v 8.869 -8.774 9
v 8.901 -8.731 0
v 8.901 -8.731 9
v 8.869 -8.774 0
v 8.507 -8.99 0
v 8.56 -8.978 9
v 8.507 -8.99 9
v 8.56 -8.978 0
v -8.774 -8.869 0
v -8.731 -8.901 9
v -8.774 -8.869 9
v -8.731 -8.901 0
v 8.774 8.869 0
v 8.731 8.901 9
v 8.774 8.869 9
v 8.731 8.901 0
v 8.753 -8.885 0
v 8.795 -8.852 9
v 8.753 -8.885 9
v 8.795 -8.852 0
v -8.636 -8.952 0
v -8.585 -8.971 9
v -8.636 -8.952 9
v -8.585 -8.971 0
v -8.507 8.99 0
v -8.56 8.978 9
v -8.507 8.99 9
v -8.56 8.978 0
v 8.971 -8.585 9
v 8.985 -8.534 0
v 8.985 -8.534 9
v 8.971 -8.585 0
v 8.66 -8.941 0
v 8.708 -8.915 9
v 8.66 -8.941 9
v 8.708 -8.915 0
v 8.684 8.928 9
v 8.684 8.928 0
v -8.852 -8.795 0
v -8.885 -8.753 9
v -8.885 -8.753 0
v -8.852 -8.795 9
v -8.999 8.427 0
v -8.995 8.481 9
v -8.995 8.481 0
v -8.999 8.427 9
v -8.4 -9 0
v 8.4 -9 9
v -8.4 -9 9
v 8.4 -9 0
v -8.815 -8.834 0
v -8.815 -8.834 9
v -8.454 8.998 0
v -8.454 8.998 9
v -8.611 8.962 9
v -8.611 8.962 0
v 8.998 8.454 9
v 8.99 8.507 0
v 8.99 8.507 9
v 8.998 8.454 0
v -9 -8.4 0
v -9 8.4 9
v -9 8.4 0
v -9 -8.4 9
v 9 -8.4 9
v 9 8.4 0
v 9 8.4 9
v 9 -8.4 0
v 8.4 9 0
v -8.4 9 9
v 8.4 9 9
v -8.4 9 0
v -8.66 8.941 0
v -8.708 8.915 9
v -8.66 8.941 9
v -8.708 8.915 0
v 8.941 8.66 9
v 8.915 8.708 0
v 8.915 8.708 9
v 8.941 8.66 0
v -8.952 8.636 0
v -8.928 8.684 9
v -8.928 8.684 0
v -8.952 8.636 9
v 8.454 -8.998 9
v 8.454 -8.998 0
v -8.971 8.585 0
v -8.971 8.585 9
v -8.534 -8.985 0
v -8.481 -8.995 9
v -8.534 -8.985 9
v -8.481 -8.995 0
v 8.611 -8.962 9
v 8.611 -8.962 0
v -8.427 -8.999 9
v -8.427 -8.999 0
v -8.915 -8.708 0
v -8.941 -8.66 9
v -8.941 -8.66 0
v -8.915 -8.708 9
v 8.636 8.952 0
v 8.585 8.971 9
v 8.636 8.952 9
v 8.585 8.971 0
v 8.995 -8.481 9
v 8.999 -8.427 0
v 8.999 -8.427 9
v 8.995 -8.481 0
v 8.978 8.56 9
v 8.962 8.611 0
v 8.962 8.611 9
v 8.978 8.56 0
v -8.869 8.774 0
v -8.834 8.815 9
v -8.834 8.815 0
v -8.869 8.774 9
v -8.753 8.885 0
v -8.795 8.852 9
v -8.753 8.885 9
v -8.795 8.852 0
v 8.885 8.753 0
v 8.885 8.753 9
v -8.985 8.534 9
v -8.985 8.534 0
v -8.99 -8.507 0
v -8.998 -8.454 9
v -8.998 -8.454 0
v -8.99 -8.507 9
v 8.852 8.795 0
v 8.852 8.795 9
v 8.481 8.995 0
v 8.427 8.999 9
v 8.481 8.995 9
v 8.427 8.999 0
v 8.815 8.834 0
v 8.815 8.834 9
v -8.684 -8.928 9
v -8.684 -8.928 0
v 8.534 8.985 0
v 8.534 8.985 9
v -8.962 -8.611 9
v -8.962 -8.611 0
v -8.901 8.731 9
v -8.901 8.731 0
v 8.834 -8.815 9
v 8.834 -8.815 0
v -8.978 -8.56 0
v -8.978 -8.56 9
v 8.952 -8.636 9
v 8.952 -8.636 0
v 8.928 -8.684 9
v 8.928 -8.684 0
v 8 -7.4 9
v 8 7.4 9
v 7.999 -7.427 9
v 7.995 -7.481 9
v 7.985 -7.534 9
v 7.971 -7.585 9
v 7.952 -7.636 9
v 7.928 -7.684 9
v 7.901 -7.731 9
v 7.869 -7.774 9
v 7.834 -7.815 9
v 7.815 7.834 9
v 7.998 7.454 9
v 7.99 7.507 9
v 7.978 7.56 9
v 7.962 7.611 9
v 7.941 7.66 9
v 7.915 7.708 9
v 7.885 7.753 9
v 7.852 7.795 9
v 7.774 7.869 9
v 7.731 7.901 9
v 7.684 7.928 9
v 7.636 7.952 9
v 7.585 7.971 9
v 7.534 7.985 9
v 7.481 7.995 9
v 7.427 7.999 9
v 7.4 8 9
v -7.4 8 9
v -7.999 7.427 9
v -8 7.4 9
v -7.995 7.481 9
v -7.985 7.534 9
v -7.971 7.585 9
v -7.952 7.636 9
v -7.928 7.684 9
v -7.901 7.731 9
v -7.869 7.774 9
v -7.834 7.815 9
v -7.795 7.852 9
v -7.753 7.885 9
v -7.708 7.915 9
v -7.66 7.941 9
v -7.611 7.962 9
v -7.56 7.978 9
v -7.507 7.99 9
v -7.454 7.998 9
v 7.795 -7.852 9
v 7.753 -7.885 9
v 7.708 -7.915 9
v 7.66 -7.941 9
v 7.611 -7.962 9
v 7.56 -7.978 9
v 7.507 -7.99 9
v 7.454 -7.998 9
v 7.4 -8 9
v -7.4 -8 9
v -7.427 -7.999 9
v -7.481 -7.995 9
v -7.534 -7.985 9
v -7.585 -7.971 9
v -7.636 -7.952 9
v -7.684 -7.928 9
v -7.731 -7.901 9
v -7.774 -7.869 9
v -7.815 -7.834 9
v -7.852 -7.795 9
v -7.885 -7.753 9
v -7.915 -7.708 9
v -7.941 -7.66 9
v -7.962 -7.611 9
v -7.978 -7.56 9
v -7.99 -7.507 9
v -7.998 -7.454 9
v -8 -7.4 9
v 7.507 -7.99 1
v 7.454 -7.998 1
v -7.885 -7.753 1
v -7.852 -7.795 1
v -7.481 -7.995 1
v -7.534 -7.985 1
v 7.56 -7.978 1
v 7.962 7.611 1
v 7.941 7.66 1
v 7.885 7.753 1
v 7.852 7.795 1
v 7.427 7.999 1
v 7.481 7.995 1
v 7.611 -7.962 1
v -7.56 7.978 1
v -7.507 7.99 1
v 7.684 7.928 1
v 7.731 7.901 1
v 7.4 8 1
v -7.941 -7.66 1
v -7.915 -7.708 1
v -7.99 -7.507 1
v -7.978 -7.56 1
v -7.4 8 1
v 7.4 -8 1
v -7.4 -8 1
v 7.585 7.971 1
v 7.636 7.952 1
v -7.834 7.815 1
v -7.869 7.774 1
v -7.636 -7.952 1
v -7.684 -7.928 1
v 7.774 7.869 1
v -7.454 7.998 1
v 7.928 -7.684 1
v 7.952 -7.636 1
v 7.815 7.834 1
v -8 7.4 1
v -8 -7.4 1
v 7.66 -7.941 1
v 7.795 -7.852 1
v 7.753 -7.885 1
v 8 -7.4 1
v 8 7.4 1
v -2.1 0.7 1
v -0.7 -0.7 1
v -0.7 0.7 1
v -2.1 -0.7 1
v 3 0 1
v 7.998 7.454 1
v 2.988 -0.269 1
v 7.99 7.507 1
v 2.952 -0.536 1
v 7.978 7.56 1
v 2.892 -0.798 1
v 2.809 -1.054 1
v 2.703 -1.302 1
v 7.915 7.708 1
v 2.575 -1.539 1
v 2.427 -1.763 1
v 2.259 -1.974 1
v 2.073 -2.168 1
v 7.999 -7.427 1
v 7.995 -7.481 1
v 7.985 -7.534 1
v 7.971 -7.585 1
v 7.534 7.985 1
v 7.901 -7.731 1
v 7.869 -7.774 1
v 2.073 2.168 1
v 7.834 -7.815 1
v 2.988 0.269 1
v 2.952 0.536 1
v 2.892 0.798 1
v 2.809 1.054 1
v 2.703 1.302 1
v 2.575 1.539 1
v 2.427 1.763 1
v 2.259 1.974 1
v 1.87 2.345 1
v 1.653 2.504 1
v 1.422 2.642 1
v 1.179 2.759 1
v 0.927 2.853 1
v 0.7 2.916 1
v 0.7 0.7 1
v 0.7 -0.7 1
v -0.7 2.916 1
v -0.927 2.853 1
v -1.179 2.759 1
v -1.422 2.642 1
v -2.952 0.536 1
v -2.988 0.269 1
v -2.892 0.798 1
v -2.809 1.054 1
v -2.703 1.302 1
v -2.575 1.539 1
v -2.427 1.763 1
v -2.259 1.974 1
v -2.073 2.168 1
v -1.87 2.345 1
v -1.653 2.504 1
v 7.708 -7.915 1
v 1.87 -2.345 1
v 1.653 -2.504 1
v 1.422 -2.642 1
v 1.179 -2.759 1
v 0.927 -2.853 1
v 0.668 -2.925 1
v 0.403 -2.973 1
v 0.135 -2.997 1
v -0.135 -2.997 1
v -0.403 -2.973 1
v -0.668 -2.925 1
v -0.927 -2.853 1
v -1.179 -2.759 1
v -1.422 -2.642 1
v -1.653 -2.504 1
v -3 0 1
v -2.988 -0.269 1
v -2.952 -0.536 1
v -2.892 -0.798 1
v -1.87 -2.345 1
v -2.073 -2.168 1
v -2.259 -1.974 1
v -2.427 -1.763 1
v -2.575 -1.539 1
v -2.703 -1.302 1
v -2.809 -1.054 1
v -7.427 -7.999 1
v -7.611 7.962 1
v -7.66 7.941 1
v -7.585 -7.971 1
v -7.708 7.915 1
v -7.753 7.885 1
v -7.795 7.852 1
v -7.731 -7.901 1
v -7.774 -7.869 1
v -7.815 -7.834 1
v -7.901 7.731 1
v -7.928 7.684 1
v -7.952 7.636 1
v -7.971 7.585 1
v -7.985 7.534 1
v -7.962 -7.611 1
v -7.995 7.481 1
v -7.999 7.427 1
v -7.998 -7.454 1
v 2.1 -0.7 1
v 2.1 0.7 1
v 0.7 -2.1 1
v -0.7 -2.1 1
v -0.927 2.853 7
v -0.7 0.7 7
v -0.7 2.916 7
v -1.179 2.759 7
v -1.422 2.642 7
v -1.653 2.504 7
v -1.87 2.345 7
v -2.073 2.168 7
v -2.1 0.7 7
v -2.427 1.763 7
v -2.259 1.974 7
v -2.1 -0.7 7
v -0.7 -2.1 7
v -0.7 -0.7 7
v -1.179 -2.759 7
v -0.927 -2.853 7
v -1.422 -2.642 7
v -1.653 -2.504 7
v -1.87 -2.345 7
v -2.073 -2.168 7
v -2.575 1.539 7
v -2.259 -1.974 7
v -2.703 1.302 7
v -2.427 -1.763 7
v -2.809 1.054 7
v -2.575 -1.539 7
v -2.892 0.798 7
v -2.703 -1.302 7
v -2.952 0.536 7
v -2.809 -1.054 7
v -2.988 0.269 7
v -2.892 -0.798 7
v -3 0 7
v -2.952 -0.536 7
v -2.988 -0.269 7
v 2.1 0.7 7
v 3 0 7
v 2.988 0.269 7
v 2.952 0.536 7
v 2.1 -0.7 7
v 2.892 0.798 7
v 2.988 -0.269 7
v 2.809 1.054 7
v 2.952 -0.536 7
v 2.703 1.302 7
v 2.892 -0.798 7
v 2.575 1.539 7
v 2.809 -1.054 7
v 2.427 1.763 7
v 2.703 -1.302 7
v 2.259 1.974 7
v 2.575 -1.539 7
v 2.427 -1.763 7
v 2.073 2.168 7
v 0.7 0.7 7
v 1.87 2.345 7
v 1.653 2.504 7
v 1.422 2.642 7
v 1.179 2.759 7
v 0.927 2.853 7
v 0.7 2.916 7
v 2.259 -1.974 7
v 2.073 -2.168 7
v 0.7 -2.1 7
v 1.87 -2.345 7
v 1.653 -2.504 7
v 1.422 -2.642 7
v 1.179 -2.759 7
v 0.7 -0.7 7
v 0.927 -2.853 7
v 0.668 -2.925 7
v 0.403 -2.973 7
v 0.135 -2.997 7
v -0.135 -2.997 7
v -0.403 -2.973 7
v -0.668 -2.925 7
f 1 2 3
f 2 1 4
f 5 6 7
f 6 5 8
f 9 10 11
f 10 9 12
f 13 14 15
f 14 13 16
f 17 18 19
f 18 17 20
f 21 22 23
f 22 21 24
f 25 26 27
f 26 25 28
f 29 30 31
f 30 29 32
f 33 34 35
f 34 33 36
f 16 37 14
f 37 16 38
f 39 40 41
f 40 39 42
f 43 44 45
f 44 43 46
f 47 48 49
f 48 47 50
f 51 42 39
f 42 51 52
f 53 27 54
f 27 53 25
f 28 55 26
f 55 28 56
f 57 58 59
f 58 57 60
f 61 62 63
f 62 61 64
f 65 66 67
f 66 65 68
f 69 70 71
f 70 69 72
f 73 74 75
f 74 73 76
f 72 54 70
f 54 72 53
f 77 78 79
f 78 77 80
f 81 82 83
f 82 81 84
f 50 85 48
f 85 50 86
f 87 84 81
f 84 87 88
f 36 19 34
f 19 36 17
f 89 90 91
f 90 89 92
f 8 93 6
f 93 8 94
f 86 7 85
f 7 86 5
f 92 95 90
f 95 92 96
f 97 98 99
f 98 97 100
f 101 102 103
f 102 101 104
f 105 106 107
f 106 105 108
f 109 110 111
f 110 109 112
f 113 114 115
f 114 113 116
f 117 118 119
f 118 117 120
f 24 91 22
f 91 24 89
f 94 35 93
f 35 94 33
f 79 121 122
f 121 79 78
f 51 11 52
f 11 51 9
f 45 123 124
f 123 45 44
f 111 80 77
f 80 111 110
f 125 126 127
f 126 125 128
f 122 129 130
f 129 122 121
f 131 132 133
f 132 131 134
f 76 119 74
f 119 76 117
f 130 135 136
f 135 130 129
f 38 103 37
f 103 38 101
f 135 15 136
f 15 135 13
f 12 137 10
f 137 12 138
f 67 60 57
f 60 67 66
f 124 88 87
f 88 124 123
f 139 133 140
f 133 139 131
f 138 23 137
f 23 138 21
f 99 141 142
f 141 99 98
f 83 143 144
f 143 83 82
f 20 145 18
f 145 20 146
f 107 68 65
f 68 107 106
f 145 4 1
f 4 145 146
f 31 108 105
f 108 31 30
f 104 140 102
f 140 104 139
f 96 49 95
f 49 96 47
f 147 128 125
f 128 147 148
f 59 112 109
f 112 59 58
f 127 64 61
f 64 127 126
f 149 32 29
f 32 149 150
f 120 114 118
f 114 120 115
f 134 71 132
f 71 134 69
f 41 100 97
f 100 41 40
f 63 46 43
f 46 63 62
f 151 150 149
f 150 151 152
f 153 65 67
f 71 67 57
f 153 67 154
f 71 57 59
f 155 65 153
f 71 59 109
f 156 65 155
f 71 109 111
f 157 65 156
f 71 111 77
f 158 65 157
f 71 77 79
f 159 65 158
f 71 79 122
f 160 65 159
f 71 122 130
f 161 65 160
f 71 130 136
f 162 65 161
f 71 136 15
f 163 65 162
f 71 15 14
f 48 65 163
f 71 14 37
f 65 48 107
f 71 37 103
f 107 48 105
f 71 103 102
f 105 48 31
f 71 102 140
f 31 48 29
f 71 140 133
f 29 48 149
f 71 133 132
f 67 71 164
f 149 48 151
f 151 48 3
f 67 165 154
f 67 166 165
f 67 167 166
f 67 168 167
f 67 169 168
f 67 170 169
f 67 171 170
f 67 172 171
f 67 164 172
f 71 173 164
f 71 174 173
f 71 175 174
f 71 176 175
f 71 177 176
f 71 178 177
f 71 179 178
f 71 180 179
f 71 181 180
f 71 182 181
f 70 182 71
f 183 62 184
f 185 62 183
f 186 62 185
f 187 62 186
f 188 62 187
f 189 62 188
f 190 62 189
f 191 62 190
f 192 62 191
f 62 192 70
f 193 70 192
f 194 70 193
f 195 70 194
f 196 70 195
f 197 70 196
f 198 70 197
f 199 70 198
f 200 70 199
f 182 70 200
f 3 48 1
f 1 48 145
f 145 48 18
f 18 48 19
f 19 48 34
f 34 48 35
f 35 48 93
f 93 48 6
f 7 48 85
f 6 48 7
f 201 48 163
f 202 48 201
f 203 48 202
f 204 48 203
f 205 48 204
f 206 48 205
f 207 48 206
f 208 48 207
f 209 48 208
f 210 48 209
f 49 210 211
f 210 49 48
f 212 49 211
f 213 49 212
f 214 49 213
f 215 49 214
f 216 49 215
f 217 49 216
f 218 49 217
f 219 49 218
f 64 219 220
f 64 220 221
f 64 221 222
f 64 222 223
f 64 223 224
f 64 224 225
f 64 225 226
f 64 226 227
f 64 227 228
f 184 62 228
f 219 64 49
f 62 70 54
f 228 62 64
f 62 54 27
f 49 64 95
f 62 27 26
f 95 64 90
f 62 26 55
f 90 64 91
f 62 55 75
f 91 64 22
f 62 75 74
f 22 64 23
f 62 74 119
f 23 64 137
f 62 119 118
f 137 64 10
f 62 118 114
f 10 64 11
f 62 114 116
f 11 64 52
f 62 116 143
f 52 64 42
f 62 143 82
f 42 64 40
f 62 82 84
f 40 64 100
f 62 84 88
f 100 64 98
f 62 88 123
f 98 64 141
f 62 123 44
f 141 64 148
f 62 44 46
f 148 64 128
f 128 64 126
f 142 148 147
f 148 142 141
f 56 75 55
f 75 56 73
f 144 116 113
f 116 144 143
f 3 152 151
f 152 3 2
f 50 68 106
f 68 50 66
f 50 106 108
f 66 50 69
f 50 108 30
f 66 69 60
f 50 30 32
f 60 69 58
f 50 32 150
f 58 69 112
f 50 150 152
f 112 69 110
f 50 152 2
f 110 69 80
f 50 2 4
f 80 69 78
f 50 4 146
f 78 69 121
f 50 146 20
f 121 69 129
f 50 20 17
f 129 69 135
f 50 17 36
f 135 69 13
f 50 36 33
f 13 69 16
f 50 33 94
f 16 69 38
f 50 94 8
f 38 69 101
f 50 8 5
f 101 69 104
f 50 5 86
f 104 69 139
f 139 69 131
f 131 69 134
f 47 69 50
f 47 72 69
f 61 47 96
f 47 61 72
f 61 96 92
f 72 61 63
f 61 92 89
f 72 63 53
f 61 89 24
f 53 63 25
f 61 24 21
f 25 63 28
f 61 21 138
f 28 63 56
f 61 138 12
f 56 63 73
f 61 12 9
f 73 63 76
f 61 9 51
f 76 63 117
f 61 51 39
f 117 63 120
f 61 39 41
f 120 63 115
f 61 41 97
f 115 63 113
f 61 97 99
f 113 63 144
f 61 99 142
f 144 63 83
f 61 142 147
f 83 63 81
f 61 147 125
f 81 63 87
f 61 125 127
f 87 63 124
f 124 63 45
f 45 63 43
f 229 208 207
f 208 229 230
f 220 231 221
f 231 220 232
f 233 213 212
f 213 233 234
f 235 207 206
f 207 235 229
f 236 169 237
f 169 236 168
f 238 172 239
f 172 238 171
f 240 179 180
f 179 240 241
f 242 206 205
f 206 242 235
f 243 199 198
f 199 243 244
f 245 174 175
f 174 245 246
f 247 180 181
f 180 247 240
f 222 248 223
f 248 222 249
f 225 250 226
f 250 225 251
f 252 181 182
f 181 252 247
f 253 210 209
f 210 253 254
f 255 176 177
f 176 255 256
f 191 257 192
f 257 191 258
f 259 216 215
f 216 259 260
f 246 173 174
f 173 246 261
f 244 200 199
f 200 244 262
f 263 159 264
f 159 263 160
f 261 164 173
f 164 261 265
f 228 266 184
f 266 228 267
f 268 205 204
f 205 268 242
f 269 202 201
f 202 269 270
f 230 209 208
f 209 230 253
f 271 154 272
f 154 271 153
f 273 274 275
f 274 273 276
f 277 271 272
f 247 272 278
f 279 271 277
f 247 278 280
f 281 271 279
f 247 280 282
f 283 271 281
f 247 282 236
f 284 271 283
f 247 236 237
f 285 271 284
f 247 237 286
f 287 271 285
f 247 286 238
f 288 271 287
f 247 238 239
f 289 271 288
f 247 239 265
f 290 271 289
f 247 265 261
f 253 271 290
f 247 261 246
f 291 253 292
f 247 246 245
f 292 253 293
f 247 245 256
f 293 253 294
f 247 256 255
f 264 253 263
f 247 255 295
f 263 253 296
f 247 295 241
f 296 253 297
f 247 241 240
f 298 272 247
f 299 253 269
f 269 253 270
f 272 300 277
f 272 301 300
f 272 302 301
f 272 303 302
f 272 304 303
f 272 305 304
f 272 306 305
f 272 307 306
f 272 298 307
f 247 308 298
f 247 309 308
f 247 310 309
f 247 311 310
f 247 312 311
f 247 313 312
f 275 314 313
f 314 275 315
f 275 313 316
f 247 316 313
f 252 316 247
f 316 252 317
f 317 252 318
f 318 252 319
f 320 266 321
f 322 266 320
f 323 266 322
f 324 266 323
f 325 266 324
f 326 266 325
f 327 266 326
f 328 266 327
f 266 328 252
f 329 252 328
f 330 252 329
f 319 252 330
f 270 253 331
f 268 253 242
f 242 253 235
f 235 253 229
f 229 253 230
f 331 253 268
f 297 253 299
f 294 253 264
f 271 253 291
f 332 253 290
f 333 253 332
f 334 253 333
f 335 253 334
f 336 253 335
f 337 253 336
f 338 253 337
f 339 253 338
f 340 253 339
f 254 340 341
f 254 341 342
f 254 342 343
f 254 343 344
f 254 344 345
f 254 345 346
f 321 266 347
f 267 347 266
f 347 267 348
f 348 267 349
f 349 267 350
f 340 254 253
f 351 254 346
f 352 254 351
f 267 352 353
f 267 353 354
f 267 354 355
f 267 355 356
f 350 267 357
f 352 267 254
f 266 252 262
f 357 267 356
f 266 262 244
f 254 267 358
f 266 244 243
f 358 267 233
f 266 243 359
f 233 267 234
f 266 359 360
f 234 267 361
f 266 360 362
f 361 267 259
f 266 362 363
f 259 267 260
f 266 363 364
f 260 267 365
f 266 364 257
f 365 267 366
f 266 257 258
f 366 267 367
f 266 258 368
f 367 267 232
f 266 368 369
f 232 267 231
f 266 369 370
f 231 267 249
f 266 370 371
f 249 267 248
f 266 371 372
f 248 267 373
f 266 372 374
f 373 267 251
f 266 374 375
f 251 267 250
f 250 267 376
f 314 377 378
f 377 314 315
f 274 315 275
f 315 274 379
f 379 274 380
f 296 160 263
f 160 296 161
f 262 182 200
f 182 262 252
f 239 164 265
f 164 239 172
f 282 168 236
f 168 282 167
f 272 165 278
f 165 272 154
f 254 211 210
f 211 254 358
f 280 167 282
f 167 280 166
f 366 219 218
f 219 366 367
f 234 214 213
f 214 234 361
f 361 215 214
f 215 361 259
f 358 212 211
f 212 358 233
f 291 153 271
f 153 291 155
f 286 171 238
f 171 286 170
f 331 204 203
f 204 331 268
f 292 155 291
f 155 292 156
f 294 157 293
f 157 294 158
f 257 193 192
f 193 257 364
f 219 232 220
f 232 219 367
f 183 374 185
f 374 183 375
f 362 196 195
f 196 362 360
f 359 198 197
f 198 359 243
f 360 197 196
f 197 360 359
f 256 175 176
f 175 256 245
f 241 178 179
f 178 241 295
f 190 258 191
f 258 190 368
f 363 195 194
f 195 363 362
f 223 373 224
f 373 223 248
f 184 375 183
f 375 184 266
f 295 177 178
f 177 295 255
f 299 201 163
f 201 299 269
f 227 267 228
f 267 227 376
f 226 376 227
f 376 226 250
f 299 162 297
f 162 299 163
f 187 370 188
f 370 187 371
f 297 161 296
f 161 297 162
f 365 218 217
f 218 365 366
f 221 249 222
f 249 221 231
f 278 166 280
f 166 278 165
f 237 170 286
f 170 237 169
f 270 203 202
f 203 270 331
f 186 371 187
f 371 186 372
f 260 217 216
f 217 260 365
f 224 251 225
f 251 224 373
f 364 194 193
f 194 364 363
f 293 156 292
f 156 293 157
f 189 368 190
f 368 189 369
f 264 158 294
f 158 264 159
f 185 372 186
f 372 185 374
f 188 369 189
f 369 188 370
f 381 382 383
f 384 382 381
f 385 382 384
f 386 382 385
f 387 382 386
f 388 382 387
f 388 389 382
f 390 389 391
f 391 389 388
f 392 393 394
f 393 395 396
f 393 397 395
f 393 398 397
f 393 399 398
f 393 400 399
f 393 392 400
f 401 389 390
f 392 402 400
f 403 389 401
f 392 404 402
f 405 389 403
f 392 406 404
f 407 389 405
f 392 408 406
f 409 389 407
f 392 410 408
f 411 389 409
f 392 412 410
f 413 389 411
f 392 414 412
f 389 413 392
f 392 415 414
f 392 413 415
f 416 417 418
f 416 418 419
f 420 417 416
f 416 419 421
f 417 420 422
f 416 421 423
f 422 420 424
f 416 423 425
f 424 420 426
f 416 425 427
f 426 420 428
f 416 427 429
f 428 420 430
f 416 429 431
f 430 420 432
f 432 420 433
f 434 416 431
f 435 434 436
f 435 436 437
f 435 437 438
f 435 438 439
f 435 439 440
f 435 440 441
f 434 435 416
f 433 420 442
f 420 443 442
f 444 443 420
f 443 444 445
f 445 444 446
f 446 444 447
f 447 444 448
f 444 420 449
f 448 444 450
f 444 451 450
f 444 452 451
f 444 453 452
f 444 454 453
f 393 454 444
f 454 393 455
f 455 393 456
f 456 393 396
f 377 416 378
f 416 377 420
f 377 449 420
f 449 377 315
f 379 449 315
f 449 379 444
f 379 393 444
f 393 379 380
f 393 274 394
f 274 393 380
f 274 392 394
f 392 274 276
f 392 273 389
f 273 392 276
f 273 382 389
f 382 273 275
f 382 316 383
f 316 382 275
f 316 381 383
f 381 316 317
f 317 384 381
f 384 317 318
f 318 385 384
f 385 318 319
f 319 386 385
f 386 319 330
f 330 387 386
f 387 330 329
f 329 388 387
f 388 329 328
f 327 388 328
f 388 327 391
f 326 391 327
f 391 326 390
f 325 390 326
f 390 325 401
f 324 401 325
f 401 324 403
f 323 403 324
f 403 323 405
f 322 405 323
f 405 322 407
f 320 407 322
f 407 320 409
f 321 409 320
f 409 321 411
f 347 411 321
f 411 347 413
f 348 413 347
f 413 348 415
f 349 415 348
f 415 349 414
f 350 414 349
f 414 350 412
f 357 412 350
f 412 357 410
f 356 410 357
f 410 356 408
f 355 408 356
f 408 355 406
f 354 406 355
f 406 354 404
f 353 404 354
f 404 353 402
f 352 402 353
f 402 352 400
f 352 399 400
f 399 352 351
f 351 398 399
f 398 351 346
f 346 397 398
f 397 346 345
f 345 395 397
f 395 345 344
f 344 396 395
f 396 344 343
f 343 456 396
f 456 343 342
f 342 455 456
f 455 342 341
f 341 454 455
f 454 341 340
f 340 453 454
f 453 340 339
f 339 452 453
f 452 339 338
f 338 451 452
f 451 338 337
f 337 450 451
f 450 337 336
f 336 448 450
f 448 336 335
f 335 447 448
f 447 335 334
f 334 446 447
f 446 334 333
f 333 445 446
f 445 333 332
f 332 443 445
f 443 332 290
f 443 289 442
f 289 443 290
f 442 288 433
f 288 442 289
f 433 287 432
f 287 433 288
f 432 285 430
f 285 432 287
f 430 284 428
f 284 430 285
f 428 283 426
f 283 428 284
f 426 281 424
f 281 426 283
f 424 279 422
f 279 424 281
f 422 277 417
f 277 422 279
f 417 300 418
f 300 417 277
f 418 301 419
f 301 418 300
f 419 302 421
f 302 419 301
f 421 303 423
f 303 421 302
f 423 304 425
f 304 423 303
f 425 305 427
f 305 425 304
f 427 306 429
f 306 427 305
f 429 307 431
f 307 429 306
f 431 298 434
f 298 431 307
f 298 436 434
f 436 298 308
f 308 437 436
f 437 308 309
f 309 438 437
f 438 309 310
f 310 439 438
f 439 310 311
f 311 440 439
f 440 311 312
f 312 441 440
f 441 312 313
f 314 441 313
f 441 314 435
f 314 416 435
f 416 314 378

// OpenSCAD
$fn = 70;

cross_thickness = 1.4;
cross_length = 4.0 + 0.2;

axis_diameter = 6.0;

axis_depth = 6.0;
thickness = 1;
top_r = 0.6;
cap_width = 18.0;
cap_height = cap_width;
cap_depth = 9;

module fillet2d(r, d = 0)
{
    offset(r = r) offset(delta = -r) children(0);
}

module axis_base()
{
    difference()
    {
        circle(r = axis_diameter / 2);

        {
            square(size = [ cross_thickness, cross_length ], center = true);
            square(size = [ cross_length, cross_thickness ], center = true);
            translate([ 0, cross_length / 2 ])
            {
                square(size = [ cross_thickness, cross_length ], center = true);
            }
        }
    }
}

module axis()
{
    linear_extrude(height = axis_depth + thickness) axis_base();
}

module top_base(d = 0)
{
    fillet2d(r = top_r, d = d)
    {
        square(size = [ cap_width, cap_height ], center = true);
    }
}

module outer()
{
    difference()
    {
        linear_extrude(height = cap_depth)
        {
            fillet2d(r = top_r)
            {
                square(size = [ cap_width, cap_height ], center = true);
            }
        }

        translate([ 0, 0, thickness ])
        {
            linear_extrude(height = cap_depth)
            {
                fillet2d(r = top_r, d = thickness)
                {
                    square(size = [ cap_width - thickness * 2, cap_height - thickness * 2 ], center = true);
                }
            }
        }
    }
}

axis();
outer();
